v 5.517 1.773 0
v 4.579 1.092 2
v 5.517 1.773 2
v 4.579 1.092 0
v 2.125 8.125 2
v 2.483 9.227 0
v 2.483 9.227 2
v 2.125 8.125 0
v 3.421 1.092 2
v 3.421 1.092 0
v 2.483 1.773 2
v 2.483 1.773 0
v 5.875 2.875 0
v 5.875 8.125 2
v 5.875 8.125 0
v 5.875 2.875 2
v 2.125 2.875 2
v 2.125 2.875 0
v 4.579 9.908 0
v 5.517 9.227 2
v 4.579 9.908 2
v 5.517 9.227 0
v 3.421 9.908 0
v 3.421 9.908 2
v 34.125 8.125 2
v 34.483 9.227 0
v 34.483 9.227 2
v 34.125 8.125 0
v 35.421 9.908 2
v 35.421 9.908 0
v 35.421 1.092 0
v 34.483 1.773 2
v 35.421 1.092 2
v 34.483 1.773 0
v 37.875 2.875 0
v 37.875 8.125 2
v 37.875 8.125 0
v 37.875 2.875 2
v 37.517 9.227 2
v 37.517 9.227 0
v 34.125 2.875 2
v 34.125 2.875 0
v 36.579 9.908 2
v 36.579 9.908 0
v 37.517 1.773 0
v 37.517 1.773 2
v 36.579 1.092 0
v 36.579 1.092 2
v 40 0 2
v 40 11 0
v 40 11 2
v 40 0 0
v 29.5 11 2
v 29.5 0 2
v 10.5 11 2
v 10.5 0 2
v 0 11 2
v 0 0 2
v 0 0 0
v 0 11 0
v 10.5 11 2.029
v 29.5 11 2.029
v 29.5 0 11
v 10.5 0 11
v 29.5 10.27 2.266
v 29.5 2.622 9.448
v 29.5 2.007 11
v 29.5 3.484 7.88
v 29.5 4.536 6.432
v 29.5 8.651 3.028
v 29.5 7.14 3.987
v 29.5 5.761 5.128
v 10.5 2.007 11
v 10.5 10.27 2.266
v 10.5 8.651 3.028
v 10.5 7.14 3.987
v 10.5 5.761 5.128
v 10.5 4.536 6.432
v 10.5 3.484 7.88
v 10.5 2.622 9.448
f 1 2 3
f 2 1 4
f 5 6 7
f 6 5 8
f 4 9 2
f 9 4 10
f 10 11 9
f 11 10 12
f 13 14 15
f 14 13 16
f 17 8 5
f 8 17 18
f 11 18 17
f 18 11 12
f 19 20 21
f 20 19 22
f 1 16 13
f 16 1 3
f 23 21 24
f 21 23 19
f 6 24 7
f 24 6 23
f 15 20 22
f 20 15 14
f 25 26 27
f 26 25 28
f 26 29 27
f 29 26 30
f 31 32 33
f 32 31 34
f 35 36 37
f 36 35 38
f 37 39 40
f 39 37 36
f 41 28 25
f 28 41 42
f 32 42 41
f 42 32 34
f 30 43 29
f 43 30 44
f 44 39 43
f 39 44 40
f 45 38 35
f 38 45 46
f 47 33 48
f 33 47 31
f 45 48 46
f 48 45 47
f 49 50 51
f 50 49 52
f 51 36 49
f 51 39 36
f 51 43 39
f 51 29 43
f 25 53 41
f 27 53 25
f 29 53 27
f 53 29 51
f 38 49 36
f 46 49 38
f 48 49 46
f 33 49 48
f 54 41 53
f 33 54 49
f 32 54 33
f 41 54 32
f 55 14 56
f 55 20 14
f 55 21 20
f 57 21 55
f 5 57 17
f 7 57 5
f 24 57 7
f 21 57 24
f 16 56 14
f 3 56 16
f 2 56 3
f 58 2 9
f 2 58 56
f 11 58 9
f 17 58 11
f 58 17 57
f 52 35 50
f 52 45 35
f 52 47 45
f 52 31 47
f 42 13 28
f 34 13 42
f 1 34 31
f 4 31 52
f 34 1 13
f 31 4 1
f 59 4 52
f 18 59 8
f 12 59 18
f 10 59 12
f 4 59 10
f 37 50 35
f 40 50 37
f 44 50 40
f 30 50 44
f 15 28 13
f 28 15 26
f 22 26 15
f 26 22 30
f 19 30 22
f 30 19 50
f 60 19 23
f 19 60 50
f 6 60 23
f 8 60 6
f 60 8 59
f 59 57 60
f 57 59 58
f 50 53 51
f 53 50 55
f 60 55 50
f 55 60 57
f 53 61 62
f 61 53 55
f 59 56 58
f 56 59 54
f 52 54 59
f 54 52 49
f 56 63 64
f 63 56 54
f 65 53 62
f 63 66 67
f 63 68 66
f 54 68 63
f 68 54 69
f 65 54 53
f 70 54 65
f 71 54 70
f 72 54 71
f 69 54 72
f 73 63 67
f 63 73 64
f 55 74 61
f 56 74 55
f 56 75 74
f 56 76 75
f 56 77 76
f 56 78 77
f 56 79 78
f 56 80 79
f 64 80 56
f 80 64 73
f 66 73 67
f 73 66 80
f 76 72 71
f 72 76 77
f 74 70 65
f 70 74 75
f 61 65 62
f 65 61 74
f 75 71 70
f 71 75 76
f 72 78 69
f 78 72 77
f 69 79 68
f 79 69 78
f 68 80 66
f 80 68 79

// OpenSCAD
// [FL_INDEX: keywords="openscad, 3d_parametric, Customizable_Catch_for_Cabinet_Latch, csg_solid" | COT="Parametric OpenSCAD design from 3DCodeverse"]
// Title: Customizable Catch for Cabinet Latch

/****************************************************/
/*************User specified parameters**************/

//length of catch base
length = 40; // [5:100]

//width of catch base
width = 11; // [5:100]

//maximum height of catch
height = 11; // [5:100]

//thickness of catch base
base_thick = 2; // [0.25:5]

//width of flat portion at the top of catch
top_width = 2; // [0.25:5]

//the length (along the long axis) of the curved portion of the catch
curve_length = 19; // [5:100]

//max deviation of curve from a straight line. Place straight edge against curve, and find the max gap.
sag = 1.5; // [0.25:5]

//center to center spacing of holes
hole_spacing = 32; // [5:100]

//wide axis of hole
hole_length = 9; // [5:100]

//narrow axis of hole
hole_width = 3.75; // [0.25:5]

//fudge factor to ensure overlaps
wiggle = 0.1; // [0.001,0.01,0.1]

$fn=10;
/****************************************************/

/***************Calculated parameters****************/
curve_height = height - base_thick; // height of curved portion of catch
curve_width = width - top_width; // width of curved portion of catch
curve_chord_length = sqrt(pow(curve_height,2) + pow(curve_width,2)); // length of the chord connecting the uppermost and lowermost points on the curve
R = (pow(curve_chord_length/2,2)+pow(sag,2))/(2*sag); // Radius of the curve
ratio = curve_height/curve_width; // calculated parameter to make algebra easier
A = 1 + pow(ratio,2); // first coefficient of y quadratic equation
B = curve_height; // second coefficient of y quadratic equation
C = pow(curve_width,2)*A/4-pow(R,2)/A; // third coefficient of y quadratic equation
y = (-B + sqrt(pow(B,2) - 4*C))/2; // vertical distance from top of catch to the center of curvature
x = curve_width*(pow(ratio,2) - 1)/2 + ratio*y; // horizontal distance from top of catch to the center of curvature
echo (str("R = ",R));
echo (str("x = ",x));
echo (str("y = ",y));
echo (str("ratio = ",ratio));
echo (str("discriminant = ",pow(B,2) - 4*A*C));
/****************************************************/

union(){	
	difference(){
		cube([length,width,base_thick]);
		for (i=[-1,1]){
			translate([length/2 + i*hole_spacing/2,(width - hole_length + hole_width)/2,-wiggle]) #screwhole();
		}
	}
	
	difference(){
		translate([(length-curve_length)/2,0,base_thick]) cube([curve_length,width,curve_height]);
		#translate([(length-curve_length)/2-wiggle,width + x,height + y]) rotate([0,90,0]) cylinder(h=curve_length+2*wiggle,r=R,center=false,$fn=50);
	}
}


module screwhole()
{
	hull(){
		cylinder(h=base_thick+2*wiggle,r=hole_width/2,center=false);
		translate([0,5.25,0]) cylinder(h=base_thick+2*wiggle,r=hole_width/2,center=false);
	}
}
